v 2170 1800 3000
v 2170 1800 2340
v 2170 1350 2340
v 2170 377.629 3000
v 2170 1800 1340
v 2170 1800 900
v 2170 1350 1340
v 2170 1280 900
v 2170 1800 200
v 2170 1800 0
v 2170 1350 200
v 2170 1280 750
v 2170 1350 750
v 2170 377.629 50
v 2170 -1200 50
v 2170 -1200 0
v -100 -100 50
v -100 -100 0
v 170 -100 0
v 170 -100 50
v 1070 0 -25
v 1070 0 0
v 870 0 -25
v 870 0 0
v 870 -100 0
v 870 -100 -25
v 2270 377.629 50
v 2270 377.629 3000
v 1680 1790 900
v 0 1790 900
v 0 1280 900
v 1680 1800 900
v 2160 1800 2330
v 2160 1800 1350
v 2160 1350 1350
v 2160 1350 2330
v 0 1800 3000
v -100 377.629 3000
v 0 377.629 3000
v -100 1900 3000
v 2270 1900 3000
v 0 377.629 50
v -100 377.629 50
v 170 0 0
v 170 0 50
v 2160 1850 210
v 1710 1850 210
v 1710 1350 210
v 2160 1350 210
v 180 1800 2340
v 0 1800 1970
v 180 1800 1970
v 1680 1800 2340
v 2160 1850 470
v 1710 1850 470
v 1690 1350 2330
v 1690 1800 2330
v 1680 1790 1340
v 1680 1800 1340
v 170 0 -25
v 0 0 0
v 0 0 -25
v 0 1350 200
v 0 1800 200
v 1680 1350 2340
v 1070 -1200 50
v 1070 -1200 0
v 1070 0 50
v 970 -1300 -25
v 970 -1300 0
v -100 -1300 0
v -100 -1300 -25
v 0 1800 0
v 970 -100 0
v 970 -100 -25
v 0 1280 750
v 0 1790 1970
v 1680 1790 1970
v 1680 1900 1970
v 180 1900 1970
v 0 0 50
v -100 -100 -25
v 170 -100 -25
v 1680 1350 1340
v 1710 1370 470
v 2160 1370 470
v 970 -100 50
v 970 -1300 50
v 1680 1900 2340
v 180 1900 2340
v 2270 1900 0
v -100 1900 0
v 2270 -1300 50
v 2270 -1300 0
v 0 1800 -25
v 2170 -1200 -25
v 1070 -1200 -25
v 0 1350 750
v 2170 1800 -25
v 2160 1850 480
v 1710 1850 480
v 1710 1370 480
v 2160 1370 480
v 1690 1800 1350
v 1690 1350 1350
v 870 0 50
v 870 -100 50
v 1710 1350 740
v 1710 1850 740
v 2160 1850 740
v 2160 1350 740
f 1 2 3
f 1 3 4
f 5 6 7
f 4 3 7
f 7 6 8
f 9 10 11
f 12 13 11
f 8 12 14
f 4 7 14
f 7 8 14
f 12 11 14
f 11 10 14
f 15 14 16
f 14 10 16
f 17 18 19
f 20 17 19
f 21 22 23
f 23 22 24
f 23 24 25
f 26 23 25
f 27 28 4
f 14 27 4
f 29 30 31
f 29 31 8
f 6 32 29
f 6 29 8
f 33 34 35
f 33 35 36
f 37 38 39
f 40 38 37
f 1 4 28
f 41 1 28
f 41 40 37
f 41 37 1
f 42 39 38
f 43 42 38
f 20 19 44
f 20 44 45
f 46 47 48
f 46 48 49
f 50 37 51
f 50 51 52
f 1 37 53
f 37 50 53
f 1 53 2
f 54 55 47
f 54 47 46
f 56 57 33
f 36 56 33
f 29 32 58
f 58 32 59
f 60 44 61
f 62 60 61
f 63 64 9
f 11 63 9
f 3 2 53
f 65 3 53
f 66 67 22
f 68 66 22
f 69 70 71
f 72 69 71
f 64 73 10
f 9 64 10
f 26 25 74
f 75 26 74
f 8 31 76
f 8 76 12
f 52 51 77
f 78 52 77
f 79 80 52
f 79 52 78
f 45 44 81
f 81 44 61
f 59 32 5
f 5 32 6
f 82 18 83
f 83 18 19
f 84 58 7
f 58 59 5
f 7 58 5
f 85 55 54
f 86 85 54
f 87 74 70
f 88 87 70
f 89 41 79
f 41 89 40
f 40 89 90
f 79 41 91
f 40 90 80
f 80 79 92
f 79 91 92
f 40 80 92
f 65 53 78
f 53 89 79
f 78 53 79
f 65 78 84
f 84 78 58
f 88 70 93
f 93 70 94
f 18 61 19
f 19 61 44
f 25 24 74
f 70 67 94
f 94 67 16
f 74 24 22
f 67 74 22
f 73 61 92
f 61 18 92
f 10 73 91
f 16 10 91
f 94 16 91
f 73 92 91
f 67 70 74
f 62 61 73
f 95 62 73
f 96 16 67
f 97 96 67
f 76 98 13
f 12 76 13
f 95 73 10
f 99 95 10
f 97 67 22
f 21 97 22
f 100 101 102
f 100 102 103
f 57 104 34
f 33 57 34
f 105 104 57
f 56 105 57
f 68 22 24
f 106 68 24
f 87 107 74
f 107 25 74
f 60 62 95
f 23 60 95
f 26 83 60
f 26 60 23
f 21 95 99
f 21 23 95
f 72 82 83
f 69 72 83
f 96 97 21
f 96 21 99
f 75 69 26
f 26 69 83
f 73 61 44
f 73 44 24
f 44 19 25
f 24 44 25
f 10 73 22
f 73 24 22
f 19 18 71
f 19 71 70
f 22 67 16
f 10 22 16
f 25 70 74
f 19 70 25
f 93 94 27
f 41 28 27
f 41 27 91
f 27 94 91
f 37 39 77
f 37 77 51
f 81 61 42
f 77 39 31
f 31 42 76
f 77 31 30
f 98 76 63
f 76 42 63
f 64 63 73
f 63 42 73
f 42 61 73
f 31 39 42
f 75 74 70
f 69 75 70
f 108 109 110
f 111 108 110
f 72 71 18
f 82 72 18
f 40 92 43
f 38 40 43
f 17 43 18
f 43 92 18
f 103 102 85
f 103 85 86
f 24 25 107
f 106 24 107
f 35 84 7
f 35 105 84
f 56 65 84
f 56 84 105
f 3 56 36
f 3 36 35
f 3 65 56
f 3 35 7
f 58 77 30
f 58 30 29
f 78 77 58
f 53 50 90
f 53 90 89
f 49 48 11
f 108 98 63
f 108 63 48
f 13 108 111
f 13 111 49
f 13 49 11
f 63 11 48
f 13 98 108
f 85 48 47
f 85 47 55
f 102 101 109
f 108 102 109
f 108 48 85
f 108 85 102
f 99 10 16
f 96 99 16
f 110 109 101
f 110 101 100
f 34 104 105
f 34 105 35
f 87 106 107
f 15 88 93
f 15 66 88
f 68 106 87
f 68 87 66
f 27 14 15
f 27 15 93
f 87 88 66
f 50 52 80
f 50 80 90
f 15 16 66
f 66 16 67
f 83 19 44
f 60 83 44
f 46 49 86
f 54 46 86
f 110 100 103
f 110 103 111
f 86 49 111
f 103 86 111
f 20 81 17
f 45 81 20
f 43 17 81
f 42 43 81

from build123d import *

# Parameters (mm, degrees)
F1_DEPTH  = 3000
F2_W      = 700
F2_H      = 2100
F3_DEPTH  = 100
F4_W      = 1500
F4_H      = 370
F5_DEPTH  = 100
F7_DEPTH  = 25
F9_DEPTH  = 2950
F10_W     = 2170
F10_H     = 700
F11_DEPTH = 450
F12_W     = 2170
F12_H     = 70
F12_H_2   = 450
F13_DEPTH = 150
F14_W     = 1680
F14_H     = 1070
F15_DEPTH = 10
F17_W     = 450
F17_H     = 530
F18_DEPTH = 500
F19_W     = 450
F19_H     = 10
F20_DEPTH = 480
F21_W     = 470
F21_H     = 980
F22_DEPTH = 450


with BuildPart() as f1:
    # F0 (on Top) → F1 (new body)
    with BuildSketch(Plane.XY):
        Polygon((2270, 1900), (-100, 1900), (-100, -100), (970, -100), (970, -1300), (2270, -1300), align=None)
        Polygon((1070, 0), (0, 0), (0, 1800), (2170, 1800), (2170, -1200), (1070, -1200), align=None, mode=Mode.SUBTRACT)
    extrude(amount=F1_DEPTH)

    # F2 (on face) → F3 (cut, through all)
    with BuildSketch(Plane.XZ.offset(100)):
        with Locations((520, 1050)):
            Rectangle(F2_W, F2_H)
    extrude(amount=-F3_DEPTH, mode=Mode.SUBTRACT)

    # F4 (on face) → F5 (cut, through all)
    with BuildSketch(Plane.XZ.offset(-1800)):
        with Locations((930, 2155)):
            Rectangle(F4_W, F4_H)
    extrude(amount=-F5_DEPTH, mode=Mode.SUBTRACT)

    # F8 (on face) → F9 (cut)
    with BuildSketch(Plane.XY.offset(3000)):
        Polygon((-472.080886364, -1550.0288009644), (2466.6786193848, -1550.0288009644), (2466.6786193848, 377.6288926601), (2270, 377.6288926601), (2270, -1300), (970, -1300), (970, -100), (-100, -100), (-100, 377.6288926601), (-472.080886364, 377.6288926601), align=None)
        Polygon((2170, -1200), (2170, 377.6288926601), (0, 377.6288926601), (0, 0), (1070, 0), (1070, -1200), align=None)
        Polygon((2270, -1300), (2270, 377.6288926601), (2170, 377.6288926601), (2170, -1200), (1070, -1200), (1070, 0), (0, 0), (0, 377.6288926601), (-100, 377.6288926601), (-100, -100), (970, -100), (970, -1300), align=None)
    extrude(amount=-F9_DEPTH, mode=Mode.SUBTRACT)

    # F10 (on face) → F11 (join)
    with BuildSketch(Plane.XZ.offset(-1800)):
        with Locations((1085, 550)):
            Rectangle(F10_W, F10_H)
    extrude(amount=F11_DEPTH)

    # F12 (on face) → F13 (join)
    with BuildSketch(Plane.XY.offset(900)):
        with Locations((1085, 1315)):
            Rectangle(F12_W, F12_H)
        with Locations((1085, 1575)):
            Rectangle(F12_W, F12_H_2)
    extrude(amount=-F13_DEPTH)

    # F14 (on face) → F15 (join)
    with BuildSketch(Plane.XZ.offset(-1800)):
        with Locations((840, 1435)):
            Rectangle(F14_W, F14_H)
    extrude(amount=F15_DEPTH)

    # F17 (on face) → F18 (cut)
    with BuildSketch(Plane.XZ.offset(-1350)):
        with Locations((1935, 475)):
            Rectangle(F17_W, F17_H)
    extrude(amount=-F18_DEPTH, mode=Mode.SUBTRACT)

    # F19 (on face) → F20 (join)
    with BuildSketch(Plane.XZ.offset(-1850)):
        with Locations((1935, 475)):
            Rectangle(F19_W, F19_H)
    extrude(amount=F20_DEPTH)

    # F21 (on face) → F22 (join)
    with BuildSketch(Plane.XZ.offset(-1800)):
        Polygon((2170, 2340), (1680, 2340), (1680, 1970), (1680, 1340), (2170, 1340), align=None)
        with Locations((1925, 1840)):
            Rectangle(F21_W, F21_H, mode=Mode.SUBTRACT)
    extrude(amount=F22_DEPTH)


with BuildPart() as f7:
    # F6 (on face) → F7 (new body)
    with BuildSketch(Plane(origin=(0, 0, 0), x_dir=(1, 0, 0), z_dir=(0, 0, -1))):
        Polygon((-100, 1300), (-100, 100), (170, 100), (170, 0), (0, 0), (0, -1800), (2170, -1800), (2170, 1200), (1070, 1200), (1070, 0), (870, 0), (870, 100), (970, 100), (970, 1300), align=None)
    extrude(amount=F7_DEPTH)


solid = Compound([f1.part, f7.part])
